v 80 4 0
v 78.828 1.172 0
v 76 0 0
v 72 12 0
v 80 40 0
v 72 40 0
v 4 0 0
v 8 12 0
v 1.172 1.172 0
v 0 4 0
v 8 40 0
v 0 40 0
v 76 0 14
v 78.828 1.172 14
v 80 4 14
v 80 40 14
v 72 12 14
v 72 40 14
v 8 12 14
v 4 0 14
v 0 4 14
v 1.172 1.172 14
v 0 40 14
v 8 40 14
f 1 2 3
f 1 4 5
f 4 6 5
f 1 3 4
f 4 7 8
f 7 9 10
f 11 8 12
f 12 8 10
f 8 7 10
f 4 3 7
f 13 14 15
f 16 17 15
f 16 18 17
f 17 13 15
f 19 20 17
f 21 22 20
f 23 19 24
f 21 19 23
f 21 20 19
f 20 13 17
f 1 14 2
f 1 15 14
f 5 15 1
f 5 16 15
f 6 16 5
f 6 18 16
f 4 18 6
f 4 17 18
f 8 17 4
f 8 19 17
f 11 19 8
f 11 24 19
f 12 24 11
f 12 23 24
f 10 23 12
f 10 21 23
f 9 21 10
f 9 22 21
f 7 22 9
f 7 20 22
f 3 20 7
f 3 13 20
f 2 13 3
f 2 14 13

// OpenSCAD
$fn = 32;

// ----------------------------------------------------------------------
// Heat sink frame: 80 x 40 mm frame, 8 mm walls
// ----------------------------------------------------------------------

// --- parameters (mm) ---
profile_height = 14;      // extrusion height
profile_points = 12;      // points of the closed outline

profile = [[0, 4], [1.172, 1.172], [4, 0], [76, 0], [78.828, 1.172], [80, 4], [80, 40], [72, 40], [72, 12], [8, 12], [8, 40], [0, 40]];  // single closed polygon, 12 points, counter clockwise

// --- the one profile operation ---
linear_extrude(height = profile_height) polygon(points = profile);
